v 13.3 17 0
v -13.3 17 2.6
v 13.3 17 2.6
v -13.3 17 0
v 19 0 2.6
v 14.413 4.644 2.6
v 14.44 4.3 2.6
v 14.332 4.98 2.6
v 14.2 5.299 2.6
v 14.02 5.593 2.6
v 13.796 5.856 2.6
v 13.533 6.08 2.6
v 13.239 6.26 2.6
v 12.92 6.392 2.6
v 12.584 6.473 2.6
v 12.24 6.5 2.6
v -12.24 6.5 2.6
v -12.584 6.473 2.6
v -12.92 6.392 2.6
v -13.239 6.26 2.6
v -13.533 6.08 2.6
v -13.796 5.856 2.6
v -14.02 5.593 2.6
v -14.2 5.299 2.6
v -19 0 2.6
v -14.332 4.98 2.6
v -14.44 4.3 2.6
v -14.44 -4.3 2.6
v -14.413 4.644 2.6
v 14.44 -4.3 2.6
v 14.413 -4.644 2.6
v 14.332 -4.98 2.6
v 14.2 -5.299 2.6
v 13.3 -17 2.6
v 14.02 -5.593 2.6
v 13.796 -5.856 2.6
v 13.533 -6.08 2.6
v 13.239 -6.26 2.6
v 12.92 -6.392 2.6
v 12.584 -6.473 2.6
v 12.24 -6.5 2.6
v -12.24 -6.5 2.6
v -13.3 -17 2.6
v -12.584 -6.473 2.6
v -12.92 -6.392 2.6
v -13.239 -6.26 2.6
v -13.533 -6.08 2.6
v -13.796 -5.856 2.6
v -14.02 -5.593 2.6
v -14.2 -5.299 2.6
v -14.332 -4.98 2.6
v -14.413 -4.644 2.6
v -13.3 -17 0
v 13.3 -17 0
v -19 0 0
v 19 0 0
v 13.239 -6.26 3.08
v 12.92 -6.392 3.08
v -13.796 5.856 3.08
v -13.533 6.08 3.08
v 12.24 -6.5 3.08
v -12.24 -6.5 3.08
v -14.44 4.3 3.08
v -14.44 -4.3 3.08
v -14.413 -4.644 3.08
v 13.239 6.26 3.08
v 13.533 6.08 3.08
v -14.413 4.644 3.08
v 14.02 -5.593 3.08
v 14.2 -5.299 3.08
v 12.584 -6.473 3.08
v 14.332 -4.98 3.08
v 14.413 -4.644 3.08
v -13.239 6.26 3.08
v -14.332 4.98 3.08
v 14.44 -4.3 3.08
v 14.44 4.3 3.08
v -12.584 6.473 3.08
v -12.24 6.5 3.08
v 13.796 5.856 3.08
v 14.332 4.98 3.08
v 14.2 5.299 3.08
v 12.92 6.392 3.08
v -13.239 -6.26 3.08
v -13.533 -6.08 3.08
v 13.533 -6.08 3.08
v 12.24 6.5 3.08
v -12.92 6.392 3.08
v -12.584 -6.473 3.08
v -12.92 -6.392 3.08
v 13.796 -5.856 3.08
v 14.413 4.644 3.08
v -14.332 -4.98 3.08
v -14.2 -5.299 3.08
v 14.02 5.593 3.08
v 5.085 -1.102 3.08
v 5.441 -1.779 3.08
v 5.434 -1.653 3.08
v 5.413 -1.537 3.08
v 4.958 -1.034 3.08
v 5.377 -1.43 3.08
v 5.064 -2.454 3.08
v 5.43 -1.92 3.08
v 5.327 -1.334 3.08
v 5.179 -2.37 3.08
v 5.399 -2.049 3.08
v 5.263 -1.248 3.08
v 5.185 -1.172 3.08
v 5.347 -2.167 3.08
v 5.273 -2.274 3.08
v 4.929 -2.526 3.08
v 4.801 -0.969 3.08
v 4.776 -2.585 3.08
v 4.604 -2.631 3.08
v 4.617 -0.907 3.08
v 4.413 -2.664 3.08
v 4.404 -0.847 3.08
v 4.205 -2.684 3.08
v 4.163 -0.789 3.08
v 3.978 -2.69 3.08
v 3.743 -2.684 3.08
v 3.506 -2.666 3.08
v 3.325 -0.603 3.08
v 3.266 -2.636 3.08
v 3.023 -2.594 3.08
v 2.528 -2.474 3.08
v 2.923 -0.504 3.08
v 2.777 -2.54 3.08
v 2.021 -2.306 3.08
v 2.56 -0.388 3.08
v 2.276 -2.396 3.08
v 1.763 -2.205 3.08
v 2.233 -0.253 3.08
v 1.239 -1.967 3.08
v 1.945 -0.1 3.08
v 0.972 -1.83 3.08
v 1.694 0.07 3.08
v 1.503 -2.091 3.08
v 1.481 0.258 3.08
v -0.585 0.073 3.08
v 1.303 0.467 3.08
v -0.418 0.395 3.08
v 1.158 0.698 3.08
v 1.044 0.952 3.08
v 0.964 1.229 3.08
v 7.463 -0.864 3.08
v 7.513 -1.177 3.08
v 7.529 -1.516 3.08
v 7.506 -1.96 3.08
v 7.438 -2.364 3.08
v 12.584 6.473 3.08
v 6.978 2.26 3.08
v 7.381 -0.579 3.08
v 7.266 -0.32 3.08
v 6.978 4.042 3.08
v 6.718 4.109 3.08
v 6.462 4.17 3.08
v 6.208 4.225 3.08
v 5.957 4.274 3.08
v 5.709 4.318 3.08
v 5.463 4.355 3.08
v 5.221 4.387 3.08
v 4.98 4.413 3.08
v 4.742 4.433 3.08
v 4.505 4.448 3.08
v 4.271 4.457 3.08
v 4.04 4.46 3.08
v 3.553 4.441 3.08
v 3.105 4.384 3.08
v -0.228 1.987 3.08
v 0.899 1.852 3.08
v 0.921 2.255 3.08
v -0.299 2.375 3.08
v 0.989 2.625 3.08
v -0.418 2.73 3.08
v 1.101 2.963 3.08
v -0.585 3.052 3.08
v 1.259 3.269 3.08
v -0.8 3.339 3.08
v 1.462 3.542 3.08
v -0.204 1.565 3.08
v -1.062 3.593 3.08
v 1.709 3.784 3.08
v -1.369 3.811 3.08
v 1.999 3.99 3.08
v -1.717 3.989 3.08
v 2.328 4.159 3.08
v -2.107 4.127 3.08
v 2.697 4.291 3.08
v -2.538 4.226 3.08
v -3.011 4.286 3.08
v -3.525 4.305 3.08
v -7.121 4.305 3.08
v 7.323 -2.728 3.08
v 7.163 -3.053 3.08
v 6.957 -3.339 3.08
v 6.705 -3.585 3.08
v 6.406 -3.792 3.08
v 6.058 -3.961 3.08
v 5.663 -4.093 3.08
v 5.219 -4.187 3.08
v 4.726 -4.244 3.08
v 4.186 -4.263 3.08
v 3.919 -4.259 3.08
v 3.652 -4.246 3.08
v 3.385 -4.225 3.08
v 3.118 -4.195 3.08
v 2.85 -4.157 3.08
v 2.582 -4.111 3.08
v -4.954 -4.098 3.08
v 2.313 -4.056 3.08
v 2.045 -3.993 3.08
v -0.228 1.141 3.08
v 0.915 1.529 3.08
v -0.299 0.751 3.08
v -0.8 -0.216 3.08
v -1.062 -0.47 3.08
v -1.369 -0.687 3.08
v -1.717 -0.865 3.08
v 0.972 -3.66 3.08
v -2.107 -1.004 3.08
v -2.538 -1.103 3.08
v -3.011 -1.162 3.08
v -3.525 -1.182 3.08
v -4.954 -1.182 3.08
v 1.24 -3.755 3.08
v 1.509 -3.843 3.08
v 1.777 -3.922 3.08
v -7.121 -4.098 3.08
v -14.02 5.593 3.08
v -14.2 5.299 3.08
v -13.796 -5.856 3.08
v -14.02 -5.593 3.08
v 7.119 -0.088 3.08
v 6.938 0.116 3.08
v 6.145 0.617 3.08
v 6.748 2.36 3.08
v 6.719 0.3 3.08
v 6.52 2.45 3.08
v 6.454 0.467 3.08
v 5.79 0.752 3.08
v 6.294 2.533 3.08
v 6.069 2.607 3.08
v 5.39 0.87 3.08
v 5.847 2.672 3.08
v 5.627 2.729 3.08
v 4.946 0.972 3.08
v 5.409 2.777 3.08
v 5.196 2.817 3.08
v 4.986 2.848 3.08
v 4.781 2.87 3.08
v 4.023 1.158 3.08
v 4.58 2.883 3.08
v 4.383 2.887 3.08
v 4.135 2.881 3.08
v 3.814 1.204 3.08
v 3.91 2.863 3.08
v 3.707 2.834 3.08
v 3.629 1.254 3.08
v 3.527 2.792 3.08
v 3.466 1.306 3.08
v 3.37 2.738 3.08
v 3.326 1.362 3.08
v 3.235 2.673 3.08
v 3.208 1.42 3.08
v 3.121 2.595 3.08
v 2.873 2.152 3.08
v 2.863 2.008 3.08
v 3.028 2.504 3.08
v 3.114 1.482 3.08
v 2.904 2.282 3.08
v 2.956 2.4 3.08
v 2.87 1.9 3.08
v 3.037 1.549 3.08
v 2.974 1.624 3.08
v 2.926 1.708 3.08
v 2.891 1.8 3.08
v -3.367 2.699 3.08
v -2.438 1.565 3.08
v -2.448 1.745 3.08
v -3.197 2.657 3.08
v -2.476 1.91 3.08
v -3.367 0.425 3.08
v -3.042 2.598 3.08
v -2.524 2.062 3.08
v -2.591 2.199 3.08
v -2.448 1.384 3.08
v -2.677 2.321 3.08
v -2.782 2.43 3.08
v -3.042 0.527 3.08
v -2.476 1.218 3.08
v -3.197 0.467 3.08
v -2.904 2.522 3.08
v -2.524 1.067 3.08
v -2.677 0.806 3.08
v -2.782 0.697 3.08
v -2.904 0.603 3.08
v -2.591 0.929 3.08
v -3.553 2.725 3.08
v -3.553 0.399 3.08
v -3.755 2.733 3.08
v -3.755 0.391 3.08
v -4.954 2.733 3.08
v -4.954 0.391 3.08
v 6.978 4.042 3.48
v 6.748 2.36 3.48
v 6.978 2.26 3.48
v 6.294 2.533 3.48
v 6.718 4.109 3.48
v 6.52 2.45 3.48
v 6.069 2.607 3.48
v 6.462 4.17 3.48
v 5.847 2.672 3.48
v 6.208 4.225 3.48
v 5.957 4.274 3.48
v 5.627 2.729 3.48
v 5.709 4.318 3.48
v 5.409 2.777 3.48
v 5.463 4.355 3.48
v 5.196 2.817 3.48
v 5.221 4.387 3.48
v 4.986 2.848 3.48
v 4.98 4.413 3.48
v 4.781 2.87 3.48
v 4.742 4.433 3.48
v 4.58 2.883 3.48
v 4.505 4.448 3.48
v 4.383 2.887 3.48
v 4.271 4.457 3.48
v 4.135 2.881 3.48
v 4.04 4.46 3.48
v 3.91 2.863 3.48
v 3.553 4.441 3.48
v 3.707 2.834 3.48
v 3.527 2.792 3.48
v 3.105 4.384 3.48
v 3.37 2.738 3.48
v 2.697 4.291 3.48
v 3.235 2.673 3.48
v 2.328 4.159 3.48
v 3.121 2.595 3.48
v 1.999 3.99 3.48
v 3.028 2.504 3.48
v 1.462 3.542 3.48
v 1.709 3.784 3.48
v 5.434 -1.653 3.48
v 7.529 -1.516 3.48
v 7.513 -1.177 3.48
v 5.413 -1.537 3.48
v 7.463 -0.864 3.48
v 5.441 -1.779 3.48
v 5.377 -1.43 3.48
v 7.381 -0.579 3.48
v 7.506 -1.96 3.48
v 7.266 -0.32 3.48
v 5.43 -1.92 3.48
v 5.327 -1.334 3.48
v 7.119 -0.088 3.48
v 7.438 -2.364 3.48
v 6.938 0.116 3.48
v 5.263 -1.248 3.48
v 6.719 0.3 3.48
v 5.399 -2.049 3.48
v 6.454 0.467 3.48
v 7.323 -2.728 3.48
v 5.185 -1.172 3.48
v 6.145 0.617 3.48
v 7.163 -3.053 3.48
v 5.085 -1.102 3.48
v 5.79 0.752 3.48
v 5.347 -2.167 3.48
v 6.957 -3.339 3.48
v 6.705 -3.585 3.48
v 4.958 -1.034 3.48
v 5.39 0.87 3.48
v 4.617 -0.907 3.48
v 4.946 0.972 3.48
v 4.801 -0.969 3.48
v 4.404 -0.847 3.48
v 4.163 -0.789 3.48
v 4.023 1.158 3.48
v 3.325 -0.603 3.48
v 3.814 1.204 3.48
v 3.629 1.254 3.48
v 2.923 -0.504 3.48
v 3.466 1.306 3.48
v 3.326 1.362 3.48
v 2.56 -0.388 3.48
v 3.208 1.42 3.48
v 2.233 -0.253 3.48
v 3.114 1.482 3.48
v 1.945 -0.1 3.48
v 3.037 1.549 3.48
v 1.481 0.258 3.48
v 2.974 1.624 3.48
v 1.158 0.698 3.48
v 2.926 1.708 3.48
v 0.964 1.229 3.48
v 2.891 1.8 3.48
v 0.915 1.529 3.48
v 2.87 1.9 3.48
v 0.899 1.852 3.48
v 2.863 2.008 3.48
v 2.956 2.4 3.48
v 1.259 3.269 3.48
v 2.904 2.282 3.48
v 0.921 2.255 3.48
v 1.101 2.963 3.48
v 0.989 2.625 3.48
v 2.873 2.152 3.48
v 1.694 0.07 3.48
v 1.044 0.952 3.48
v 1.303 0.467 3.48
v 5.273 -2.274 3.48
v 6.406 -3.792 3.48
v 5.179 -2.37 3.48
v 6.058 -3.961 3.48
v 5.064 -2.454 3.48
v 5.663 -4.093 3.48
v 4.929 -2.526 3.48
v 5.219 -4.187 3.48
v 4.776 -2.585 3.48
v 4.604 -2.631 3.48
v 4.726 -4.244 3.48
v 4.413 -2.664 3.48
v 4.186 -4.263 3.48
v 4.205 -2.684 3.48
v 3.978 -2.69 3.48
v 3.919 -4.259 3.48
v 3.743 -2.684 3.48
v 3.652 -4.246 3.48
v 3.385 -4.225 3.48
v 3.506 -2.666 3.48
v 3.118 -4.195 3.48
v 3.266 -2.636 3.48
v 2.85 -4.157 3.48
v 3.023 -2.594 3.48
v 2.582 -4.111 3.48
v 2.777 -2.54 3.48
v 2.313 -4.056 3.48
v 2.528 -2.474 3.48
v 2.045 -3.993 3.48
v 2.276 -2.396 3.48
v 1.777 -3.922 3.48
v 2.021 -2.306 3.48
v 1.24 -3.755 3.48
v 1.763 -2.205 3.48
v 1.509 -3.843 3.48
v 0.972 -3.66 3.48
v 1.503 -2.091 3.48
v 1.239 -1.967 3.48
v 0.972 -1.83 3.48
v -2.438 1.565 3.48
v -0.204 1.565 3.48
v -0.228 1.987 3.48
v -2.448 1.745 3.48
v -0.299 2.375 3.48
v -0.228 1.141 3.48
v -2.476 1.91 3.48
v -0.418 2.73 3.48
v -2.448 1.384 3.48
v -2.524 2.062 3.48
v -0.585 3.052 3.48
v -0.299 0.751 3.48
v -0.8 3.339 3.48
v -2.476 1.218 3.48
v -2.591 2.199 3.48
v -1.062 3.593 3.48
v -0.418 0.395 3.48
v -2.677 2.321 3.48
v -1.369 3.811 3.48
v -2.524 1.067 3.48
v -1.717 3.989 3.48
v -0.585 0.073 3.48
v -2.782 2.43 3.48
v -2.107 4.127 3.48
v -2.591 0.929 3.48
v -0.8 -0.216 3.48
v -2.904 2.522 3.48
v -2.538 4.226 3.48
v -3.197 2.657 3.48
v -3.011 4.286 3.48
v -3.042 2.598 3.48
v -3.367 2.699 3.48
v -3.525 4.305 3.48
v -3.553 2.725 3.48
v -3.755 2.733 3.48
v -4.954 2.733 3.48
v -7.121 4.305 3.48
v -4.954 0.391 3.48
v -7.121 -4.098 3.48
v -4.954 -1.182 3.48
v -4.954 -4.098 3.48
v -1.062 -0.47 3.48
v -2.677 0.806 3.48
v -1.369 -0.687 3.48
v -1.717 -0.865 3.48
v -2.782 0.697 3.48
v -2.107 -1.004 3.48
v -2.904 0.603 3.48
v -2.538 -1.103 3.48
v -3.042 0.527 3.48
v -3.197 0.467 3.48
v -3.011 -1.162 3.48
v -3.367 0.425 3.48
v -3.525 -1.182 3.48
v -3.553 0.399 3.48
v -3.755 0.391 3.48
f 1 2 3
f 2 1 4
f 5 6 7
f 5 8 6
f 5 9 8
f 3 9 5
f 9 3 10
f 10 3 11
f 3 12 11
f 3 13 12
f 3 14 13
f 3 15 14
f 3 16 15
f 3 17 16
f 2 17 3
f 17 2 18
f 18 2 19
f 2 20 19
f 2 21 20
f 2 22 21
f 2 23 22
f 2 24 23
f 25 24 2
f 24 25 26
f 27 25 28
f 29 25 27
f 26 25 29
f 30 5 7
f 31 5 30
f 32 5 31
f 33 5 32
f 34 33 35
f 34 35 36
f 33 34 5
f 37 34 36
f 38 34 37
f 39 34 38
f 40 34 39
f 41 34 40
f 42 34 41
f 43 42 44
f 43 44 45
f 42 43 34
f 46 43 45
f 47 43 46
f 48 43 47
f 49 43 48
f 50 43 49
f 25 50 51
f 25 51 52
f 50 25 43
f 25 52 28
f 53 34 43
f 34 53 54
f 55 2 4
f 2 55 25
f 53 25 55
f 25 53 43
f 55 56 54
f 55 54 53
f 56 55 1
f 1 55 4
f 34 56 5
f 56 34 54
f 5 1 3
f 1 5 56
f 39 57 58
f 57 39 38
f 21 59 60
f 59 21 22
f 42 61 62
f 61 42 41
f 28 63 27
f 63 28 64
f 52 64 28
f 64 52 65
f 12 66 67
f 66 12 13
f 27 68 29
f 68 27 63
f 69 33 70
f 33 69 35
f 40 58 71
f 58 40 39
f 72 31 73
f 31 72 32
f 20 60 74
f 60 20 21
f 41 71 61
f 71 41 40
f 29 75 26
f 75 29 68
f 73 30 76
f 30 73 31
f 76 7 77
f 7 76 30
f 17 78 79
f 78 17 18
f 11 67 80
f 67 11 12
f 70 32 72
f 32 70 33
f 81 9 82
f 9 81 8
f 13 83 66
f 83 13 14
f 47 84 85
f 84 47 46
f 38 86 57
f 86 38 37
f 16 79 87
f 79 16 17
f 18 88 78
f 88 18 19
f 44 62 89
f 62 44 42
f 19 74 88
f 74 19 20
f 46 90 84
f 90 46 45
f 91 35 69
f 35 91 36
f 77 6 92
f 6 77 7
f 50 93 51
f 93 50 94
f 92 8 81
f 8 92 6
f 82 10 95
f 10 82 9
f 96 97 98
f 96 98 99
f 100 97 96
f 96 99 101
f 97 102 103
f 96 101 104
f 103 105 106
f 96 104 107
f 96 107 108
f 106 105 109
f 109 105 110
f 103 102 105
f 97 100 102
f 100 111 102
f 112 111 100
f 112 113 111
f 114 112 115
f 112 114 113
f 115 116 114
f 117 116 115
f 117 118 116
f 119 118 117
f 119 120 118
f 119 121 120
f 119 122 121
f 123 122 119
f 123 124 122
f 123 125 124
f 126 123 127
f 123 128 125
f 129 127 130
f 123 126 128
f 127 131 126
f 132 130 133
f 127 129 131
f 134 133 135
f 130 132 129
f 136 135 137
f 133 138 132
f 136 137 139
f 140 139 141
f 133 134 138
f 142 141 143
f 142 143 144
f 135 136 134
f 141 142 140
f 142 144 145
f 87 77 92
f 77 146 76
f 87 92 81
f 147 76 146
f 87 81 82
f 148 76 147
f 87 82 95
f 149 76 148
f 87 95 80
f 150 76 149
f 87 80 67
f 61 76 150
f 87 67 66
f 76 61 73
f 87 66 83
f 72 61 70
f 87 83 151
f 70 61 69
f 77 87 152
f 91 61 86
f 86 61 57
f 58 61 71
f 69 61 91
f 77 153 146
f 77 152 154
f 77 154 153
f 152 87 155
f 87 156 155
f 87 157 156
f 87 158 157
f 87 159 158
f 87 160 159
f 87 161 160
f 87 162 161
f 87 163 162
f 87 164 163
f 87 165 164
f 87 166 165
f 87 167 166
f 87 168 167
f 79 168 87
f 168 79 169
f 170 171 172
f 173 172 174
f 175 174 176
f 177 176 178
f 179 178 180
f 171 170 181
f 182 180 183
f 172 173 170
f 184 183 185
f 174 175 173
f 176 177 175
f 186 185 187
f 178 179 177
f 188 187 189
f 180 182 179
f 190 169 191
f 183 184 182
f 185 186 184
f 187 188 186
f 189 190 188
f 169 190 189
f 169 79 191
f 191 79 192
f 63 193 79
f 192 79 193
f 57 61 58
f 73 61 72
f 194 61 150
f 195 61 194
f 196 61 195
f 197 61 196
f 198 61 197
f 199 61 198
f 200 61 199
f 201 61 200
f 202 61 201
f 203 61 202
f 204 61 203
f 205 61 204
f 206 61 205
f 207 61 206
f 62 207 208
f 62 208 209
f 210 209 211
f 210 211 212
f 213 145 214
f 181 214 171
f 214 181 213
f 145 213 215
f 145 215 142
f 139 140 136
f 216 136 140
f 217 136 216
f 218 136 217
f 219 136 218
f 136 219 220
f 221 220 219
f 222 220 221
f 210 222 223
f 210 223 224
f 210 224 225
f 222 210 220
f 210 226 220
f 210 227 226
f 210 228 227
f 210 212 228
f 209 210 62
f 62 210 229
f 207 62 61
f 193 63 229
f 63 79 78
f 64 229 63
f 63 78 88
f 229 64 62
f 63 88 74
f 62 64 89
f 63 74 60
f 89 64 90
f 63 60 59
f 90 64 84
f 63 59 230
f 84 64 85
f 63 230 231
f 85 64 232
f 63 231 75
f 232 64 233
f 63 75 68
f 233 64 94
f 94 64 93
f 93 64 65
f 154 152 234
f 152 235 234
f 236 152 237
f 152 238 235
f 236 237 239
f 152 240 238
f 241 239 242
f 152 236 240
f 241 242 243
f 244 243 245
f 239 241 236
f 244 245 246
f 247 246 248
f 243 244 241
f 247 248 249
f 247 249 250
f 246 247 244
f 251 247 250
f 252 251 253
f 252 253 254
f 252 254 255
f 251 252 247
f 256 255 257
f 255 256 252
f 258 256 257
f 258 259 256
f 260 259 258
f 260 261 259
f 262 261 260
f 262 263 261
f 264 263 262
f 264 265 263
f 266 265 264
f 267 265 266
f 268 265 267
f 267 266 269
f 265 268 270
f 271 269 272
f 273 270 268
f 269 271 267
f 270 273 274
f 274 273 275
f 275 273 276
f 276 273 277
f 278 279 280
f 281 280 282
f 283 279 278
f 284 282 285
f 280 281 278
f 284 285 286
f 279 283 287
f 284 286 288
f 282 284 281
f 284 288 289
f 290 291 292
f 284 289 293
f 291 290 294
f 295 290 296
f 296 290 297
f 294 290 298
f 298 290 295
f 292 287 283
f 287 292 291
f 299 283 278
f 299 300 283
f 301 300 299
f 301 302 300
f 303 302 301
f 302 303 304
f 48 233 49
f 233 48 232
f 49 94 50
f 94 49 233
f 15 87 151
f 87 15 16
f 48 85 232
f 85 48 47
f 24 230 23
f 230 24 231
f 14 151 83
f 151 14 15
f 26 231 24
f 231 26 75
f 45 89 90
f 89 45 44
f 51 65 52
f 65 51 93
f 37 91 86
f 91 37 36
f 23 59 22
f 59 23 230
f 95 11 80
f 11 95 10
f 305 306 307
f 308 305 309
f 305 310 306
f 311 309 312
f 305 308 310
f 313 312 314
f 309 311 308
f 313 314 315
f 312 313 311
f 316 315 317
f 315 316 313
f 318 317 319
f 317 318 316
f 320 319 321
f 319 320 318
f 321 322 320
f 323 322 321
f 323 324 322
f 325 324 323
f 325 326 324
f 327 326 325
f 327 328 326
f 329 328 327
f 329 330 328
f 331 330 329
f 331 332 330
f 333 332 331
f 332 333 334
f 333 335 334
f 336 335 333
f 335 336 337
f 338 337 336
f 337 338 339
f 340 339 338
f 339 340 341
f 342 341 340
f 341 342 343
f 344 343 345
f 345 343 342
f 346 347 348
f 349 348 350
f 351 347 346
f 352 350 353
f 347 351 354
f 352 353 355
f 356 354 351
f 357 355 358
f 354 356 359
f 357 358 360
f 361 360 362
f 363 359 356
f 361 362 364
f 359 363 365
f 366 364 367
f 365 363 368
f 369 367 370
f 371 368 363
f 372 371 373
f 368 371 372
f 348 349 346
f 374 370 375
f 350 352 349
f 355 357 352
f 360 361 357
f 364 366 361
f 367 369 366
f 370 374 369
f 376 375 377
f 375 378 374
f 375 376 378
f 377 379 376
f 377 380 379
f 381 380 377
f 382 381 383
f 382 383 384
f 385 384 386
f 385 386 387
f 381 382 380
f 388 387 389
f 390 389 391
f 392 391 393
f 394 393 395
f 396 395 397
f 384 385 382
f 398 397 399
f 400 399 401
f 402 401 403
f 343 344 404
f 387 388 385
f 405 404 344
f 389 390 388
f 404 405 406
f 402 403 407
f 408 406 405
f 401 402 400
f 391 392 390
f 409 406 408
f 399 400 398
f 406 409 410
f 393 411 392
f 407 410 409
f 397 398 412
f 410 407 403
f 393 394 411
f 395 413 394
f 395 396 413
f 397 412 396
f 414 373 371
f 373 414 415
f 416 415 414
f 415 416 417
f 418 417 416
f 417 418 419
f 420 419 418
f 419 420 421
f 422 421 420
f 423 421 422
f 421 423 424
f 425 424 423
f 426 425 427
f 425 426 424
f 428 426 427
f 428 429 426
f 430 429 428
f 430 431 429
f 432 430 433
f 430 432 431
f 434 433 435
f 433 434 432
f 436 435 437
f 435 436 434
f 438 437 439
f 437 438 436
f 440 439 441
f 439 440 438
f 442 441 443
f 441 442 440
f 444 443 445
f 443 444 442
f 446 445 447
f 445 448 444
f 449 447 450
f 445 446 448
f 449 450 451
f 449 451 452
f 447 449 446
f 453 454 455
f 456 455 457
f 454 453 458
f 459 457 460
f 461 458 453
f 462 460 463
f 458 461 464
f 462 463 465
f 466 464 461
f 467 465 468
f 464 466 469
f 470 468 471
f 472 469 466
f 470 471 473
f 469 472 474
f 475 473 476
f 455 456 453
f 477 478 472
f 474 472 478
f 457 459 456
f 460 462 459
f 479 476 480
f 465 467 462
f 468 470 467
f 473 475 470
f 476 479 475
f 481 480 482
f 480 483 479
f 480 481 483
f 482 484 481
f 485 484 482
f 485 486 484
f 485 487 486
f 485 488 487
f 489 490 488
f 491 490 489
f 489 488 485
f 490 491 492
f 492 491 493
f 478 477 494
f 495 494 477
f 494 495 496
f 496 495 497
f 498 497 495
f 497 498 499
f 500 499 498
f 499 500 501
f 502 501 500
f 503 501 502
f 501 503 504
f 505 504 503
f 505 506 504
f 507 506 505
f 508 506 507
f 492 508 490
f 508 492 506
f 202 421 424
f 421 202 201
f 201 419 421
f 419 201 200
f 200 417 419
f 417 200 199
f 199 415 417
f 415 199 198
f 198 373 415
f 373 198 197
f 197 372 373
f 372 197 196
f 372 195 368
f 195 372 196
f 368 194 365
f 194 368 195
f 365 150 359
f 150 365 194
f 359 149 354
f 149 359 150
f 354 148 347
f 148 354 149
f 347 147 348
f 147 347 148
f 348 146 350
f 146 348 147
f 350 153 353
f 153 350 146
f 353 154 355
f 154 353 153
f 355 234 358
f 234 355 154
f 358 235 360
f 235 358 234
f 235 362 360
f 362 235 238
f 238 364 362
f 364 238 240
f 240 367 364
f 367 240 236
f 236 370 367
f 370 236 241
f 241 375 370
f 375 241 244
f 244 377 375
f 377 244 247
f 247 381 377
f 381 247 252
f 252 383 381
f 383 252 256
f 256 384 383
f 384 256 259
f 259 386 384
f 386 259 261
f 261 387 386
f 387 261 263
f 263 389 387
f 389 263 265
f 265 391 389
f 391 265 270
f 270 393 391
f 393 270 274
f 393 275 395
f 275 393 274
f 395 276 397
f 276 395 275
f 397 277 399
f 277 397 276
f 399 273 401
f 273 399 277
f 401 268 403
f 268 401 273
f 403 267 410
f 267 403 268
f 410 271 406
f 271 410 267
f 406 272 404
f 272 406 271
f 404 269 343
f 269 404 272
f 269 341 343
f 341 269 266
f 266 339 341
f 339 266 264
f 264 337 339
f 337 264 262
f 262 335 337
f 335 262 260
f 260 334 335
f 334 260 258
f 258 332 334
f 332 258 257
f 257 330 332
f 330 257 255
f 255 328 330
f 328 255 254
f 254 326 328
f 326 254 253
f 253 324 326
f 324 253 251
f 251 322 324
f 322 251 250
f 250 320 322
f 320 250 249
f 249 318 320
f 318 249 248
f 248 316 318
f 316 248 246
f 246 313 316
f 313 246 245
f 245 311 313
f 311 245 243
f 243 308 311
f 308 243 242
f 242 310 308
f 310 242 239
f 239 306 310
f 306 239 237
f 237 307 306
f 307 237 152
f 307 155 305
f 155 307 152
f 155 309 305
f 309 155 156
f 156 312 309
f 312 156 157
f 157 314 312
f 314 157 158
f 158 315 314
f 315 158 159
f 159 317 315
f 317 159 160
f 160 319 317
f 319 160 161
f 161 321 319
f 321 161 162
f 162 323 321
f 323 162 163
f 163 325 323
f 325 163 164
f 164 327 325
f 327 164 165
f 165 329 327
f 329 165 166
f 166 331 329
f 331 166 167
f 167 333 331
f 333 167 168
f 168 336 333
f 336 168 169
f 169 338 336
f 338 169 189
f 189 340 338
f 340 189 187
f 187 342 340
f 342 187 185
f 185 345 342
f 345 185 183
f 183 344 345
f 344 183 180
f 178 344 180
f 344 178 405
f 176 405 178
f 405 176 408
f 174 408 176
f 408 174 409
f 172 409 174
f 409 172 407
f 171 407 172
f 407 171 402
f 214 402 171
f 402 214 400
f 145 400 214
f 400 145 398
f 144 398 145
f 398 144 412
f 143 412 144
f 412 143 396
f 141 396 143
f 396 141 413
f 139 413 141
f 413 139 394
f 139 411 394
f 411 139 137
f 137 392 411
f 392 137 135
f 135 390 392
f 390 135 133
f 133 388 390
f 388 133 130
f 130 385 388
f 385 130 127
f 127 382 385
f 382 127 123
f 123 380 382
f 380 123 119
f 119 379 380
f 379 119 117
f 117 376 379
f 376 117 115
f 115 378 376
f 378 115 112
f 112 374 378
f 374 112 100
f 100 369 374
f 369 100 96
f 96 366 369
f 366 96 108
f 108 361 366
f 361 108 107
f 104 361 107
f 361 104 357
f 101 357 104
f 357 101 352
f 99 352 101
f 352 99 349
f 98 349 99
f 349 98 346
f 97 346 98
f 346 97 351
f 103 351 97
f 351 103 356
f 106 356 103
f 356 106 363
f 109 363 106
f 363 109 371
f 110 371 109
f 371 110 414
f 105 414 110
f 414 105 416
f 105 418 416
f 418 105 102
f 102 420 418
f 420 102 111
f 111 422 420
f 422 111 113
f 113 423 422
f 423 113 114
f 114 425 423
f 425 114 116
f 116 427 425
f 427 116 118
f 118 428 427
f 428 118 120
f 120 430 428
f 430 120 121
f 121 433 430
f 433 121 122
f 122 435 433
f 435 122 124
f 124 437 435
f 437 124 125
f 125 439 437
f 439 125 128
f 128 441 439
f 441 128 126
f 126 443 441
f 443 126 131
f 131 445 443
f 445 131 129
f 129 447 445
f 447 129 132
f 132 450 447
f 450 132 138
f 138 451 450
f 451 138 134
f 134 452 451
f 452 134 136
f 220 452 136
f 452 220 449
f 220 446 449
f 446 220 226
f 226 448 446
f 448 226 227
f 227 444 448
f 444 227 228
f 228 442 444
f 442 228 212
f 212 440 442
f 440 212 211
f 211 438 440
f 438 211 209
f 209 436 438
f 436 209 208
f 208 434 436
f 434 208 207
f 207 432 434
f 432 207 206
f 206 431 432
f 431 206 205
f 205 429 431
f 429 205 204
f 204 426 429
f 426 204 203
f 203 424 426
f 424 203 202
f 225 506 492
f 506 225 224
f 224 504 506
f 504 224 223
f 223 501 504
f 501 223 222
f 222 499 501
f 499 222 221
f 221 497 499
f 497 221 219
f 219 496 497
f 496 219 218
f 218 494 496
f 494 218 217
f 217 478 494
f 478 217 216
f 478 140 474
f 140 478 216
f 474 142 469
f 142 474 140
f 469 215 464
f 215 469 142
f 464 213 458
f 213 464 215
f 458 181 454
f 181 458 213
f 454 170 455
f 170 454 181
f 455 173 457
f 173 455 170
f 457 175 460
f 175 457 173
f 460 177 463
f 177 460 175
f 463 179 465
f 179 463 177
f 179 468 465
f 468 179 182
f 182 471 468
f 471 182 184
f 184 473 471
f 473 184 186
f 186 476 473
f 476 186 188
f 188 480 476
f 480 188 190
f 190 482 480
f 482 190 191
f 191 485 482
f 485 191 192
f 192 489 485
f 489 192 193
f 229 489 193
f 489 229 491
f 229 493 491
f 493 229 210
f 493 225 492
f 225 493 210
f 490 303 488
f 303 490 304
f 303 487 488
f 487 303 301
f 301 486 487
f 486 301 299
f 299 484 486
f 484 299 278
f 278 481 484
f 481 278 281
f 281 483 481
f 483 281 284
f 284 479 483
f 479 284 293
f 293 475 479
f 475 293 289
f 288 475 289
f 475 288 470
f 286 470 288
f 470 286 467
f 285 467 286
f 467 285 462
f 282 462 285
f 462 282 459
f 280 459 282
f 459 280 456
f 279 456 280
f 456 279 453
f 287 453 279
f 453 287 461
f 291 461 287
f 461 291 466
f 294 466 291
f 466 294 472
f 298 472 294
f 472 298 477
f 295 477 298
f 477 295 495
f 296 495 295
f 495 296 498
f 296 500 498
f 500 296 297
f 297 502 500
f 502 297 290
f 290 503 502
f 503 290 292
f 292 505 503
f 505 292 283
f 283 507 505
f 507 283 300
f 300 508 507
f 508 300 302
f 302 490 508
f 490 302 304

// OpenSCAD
// POLSOLIDE — Żeton sześciokątny
// Materiały: base=czarny (#18181B); red=czerwony (#B7131C); white=biały (#F1F0EC).
// Zapisz do STL: openscad -o element.stl -D 'part="base"' tenplik.scad
// Model na płasko: wszystkie barwy zmieniają się tylko na samym końcu druku.
$fn=40;
part="all"; // all, base, red, white
W=38; H=34; T=2.6; kind="hex";
RH=0.48; WH=0.40; // wysokość czerwonego i białego detalowania
magnet=false;
label=""; // zmień np. numer lokalu, oznaczenie stanowiska lub pomieszczenia

module rr(w,h,r){offset(r=r) square([max(0.1,w-2*r),max(0.1,h-2*r)],center=true);}
module outline(){
 if(kind=="house")polygon(points=[[-W/2,-H/2],[W/2,-H/2],[W/2,H*.13],[0,H/2],[-W/2,H*.13]]);
 else if(kind=="shield")polygon(points=[[-W*.46,H*.48],[W*.46,H*.48],[W*.49,-H*.05],[W*.25,-H*.32],[0,-H*.49],[-W*.25,-H*.32],[-W*.49,-H*.05]]);
 else if(kind=="hex")polygon(points=[[-W*.35,-H/2],[W*.35,-H/2],[W/2,0],[W*.35,H/2],[-W*.35,H/2],[-W/2,0]]);
 else if(kind=="oval")scale([W/2,H/2])circle(r=1,$fn=60);
 else if(kind=="coin")circle(d=W,$fn=72);
 else if(kind=="plaque")rr(W,H,3.0);
 else if(kind=="luggage")rr(W,H,6.5);
 else if(kind=="arch")union(){translate([0,-H*.10])rr(W,H*.8,5);translate([0,H*.14])scale([W/2,H*.37])circle(r=1,$fn=48);}
 else if(kind=="key") union(){translate([-W*.3,0])circle(d=H,$fn=48);translate([W*.08,-H*.16])square([W*.68,H*.32],center=true);translate([W*.31,-H*.27])square([W*.11,H*.20],center=true);translate([W*.42,-H*.27])square([W*.09,H*.20],center=true);}
 else if(kind=="tag")union(){rr(W-7,H,5);translate([-W/2+5,0])circle(d=H*.78,$fn=48);}
 else rr(W,H,5);
}
module hole2d(){
 if(kind=="house")translate([0,H*.29])circle(d=4.6,$fn=40);
 else if(kind=="shield")translate([0,H*.34])circle(d=4.6,$fn=40);
 else if(kind=="key")translate([-W*.3,0])circle(d=4.6,$fn=40);
 else if(kind=="oval" && !magnet)translate([-W*.34,0])circle(d=4.6,$fn=40);
 else if(kind=="tag")translate([-W*.36,0])circle(d=4.6,$fn=40);
 else if(kind=="luggage")translate([-W*.40,0])circle(d=5,$fn=40);
}
module footprint(){difference(){outline(); if(!magnet)hole2d();}}
// W małych produktach monogram PS jest większy i czytelniejszy przy dyszy 0.4 mm.
small=(W<=50 || kind=="coin" || kind=="hex");
bw= min(W*.76,64);
bh=(label=="")?(small?13:15):20;
// dla breloka w kształcie klucza środek znaku przesunięto od oczka
badgeX=(kind=="key")?W*.13:(kind=="oval"&&!magnet?W*.055:(kind=="tag"?W*.07:(kind=="luggage"?W*.03:0)));
badgeY=(kind=="house" || kind=="shield")?-H*.10:0;
module brand_patch(){translate([badgeX,badgeY])rr(bw,bh,2.2);}
module base_black(){difference(){linear_extrude(height=T,convexity=8)footprint();
 if(magnet)translate([0,0,-0.02])cylinder(h=2.14,d=10.35,$fn=48);
}}
module red_cap(){translate([0,0,T])linear_extrude(height=RH)intersection(){offset(delta=-.55)footprint();brand_patch();}}
module white_brand(){
 translate([badgeX,badgeY,T+RH])linear_extrude(height=WH)
 if(label!="") {
   translate([0,3.8])text("POLSOLIDE",font="DejaVu Sans:style=Bold",size=min(4.0,bw*.087),halign="center",valign="center");
   translate([0,-4.0])text(label,font="DejaVu Sans:style=Bold",size=min(6.4,bw/(max(2,len(label))*0.75)),halign="center",valign="center");
 }
 else if(small) text("PS",font="DejaVu Sans:style=Bold",size=8.3,halign="center",valign="center");
 else text("POLSOLIDE",font="DejaVu Sans:style=Bold",size=min(6.4,bw*.127),halign="center",valign="center");
}
if(part=="all"||part=="base")color([.094,.094,.106])base_black();
if(part=="all"||part=="red")color([.718,.075,.11])red_cap();
if(part=="all"||part=="white")color([.945,.941,.925])white_brand();
